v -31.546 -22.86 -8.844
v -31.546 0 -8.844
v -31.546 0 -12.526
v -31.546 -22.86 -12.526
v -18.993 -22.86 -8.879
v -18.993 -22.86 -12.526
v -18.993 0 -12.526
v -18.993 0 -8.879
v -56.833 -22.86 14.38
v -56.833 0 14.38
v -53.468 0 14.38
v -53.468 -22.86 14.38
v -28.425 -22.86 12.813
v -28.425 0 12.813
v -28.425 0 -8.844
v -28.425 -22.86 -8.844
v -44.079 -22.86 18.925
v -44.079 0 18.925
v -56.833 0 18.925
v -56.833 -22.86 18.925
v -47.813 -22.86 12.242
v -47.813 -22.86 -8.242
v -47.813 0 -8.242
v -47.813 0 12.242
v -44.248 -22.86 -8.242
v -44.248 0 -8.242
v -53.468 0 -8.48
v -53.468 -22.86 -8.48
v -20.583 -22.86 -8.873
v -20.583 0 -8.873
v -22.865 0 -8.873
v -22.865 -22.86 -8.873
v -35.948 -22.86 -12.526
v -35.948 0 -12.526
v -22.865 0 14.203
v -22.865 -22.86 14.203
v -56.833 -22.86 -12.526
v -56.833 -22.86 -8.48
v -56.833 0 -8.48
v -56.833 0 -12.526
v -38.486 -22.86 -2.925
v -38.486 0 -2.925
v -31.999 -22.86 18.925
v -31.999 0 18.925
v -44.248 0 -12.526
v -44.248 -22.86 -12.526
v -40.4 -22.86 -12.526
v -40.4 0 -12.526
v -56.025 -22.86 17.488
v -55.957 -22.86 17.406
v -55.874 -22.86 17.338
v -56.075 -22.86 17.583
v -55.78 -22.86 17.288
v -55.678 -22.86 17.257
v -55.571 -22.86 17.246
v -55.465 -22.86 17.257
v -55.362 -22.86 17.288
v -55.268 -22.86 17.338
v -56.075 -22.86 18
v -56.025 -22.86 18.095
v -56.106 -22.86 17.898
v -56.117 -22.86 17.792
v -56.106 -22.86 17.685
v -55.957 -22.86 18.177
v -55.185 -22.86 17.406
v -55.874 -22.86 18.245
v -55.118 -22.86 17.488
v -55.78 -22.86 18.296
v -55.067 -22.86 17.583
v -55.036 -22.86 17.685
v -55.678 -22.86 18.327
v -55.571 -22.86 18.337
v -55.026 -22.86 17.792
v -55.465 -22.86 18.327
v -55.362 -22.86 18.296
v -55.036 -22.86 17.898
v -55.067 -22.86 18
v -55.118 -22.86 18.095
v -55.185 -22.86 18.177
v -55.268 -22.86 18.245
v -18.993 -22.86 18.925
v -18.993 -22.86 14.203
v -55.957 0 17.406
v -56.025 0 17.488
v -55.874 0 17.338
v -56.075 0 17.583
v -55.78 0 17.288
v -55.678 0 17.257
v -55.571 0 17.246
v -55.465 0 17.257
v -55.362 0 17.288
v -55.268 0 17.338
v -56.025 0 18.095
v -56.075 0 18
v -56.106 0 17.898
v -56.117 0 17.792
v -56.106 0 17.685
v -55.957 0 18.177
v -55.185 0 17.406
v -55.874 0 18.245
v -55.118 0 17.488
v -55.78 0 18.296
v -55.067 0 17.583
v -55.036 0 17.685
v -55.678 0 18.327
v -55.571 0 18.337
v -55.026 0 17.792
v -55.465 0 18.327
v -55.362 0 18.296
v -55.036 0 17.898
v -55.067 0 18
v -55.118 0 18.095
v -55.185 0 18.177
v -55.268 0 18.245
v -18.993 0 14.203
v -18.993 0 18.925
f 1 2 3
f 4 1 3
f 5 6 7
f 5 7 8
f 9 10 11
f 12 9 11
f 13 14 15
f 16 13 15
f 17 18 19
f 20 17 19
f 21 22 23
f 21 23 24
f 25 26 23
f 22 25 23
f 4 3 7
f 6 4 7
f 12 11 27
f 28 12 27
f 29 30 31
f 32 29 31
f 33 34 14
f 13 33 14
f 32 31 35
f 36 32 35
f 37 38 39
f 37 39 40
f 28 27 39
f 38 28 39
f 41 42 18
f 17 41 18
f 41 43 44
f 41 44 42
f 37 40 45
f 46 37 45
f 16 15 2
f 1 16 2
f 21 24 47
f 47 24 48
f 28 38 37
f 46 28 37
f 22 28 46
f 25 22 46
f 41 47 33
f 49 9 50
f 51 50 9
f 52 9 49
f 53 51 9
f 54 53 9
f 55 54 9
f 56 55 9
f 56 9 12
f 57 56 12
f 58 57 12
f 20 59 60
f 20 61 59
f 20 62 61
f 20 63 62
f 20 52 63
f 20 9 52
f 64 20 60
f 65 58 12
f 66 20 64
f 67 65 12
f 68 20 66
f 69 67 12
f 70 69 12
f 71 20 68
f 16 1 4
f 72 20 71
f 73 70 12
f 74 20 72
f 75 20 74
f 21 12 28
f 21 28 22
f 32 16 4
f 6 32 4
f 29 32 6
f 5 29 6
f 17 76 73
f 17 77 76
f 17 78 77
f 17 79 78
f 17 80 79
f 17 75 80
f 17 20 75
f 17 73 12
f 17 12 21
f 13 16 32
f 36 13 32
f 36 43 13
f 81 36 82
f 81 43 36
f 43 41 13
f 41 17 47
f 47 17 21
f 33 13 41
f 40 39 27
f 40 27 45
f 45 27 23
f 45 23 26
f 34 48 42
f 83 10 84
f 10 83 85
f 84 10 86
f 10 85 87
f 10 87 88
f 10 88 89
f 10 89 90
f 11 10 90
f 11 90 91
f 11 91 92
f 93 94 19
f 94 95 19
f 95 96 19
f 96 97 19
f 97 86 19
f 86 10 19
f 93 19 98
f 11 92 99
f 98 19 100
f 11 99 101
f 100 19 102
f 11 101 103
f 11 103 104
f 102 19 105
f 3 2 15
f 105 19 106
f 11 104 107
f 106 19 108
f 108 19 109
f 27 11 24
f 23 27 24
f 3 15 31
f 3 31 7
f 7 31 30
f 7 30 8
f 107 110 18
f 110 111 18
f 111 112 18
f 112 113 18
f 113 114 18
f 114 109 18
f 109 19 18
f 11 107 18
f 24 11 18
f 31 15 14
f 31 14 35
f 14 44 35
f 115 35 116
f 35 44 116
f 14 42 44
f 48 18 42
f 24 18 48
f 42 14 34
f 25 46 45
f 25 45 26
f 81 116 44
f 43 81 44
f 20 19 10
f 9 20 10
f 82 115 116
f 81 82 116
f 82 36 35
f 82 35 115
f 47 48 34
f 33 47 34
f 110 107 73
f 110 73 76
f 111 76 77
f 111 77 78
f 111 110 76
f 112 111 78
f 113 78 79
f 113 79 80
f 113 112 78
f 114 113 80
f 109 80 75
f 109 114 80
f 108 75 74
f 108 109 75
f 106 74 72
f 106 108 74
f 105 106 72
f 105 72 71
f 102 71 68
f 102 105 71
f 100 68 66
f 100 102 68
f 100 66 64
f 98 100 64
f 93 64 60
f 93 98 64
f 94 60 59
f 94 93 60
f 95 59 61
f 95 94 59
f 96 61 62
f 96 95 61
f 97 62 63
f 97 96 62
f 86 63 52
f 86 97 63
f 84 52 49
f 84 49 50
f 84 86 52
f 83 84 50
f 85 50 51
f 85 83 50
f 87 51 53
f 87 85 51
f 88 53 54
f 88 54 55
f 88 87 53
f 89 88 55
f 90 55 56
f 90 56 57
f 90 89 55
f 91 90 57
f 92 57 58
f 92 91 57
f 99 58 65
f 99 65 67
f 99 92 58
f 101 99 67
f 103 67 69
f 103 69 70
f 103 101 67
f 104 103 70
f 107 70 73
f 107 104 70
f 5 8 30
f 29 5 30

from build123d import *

# Parameters (mm, degrees)
F0_R     = 0.54548
F1_DEPTH = 22.86


with BuildPart() as f1:
    # F0 (on Front) → F1 (new body)
    with BuildSketch(Plane.XZ):
        Polygon((-31.546149, -12.525664), (-18.993298, -12.525664), (-18.993298, -8.878619), (-20.582533, -8.872862), (-22.865418, -8.872862), (-22.865418, 14.203154), (-20.582533, 14.203154), (-18.993298, 14.203154), (-18.993298, 18.924711), (-31.999168, 18.924711), (-38.48568, -2.924589), (-44.079449, 18.924711), (-56.833036, 18.924711), (-56.833036, 14.379703), (-53.468131, 14.379703), (-53.468131, -8.480297), (-56.833036, -8.480297), (-56.833036, -12.525664), (-44.248171, -12.525664), (-44.248171, -8.242098), (-47.813166, -8.242098), (-47.813166, 12.242473), (-40.400241, -12.525664), (-35.947602, -12.525664), (-28.42512, 12.813221), (-28.42512, -8.844449), (-31.546149, -8.844449), align=None)
        with Locations((-55.57109, 17.791551)):
            Circle(F0_R, mode=Mode.SUBTRACT)
    extrude(amount=F1_DEPTH)


solid = f1.part
